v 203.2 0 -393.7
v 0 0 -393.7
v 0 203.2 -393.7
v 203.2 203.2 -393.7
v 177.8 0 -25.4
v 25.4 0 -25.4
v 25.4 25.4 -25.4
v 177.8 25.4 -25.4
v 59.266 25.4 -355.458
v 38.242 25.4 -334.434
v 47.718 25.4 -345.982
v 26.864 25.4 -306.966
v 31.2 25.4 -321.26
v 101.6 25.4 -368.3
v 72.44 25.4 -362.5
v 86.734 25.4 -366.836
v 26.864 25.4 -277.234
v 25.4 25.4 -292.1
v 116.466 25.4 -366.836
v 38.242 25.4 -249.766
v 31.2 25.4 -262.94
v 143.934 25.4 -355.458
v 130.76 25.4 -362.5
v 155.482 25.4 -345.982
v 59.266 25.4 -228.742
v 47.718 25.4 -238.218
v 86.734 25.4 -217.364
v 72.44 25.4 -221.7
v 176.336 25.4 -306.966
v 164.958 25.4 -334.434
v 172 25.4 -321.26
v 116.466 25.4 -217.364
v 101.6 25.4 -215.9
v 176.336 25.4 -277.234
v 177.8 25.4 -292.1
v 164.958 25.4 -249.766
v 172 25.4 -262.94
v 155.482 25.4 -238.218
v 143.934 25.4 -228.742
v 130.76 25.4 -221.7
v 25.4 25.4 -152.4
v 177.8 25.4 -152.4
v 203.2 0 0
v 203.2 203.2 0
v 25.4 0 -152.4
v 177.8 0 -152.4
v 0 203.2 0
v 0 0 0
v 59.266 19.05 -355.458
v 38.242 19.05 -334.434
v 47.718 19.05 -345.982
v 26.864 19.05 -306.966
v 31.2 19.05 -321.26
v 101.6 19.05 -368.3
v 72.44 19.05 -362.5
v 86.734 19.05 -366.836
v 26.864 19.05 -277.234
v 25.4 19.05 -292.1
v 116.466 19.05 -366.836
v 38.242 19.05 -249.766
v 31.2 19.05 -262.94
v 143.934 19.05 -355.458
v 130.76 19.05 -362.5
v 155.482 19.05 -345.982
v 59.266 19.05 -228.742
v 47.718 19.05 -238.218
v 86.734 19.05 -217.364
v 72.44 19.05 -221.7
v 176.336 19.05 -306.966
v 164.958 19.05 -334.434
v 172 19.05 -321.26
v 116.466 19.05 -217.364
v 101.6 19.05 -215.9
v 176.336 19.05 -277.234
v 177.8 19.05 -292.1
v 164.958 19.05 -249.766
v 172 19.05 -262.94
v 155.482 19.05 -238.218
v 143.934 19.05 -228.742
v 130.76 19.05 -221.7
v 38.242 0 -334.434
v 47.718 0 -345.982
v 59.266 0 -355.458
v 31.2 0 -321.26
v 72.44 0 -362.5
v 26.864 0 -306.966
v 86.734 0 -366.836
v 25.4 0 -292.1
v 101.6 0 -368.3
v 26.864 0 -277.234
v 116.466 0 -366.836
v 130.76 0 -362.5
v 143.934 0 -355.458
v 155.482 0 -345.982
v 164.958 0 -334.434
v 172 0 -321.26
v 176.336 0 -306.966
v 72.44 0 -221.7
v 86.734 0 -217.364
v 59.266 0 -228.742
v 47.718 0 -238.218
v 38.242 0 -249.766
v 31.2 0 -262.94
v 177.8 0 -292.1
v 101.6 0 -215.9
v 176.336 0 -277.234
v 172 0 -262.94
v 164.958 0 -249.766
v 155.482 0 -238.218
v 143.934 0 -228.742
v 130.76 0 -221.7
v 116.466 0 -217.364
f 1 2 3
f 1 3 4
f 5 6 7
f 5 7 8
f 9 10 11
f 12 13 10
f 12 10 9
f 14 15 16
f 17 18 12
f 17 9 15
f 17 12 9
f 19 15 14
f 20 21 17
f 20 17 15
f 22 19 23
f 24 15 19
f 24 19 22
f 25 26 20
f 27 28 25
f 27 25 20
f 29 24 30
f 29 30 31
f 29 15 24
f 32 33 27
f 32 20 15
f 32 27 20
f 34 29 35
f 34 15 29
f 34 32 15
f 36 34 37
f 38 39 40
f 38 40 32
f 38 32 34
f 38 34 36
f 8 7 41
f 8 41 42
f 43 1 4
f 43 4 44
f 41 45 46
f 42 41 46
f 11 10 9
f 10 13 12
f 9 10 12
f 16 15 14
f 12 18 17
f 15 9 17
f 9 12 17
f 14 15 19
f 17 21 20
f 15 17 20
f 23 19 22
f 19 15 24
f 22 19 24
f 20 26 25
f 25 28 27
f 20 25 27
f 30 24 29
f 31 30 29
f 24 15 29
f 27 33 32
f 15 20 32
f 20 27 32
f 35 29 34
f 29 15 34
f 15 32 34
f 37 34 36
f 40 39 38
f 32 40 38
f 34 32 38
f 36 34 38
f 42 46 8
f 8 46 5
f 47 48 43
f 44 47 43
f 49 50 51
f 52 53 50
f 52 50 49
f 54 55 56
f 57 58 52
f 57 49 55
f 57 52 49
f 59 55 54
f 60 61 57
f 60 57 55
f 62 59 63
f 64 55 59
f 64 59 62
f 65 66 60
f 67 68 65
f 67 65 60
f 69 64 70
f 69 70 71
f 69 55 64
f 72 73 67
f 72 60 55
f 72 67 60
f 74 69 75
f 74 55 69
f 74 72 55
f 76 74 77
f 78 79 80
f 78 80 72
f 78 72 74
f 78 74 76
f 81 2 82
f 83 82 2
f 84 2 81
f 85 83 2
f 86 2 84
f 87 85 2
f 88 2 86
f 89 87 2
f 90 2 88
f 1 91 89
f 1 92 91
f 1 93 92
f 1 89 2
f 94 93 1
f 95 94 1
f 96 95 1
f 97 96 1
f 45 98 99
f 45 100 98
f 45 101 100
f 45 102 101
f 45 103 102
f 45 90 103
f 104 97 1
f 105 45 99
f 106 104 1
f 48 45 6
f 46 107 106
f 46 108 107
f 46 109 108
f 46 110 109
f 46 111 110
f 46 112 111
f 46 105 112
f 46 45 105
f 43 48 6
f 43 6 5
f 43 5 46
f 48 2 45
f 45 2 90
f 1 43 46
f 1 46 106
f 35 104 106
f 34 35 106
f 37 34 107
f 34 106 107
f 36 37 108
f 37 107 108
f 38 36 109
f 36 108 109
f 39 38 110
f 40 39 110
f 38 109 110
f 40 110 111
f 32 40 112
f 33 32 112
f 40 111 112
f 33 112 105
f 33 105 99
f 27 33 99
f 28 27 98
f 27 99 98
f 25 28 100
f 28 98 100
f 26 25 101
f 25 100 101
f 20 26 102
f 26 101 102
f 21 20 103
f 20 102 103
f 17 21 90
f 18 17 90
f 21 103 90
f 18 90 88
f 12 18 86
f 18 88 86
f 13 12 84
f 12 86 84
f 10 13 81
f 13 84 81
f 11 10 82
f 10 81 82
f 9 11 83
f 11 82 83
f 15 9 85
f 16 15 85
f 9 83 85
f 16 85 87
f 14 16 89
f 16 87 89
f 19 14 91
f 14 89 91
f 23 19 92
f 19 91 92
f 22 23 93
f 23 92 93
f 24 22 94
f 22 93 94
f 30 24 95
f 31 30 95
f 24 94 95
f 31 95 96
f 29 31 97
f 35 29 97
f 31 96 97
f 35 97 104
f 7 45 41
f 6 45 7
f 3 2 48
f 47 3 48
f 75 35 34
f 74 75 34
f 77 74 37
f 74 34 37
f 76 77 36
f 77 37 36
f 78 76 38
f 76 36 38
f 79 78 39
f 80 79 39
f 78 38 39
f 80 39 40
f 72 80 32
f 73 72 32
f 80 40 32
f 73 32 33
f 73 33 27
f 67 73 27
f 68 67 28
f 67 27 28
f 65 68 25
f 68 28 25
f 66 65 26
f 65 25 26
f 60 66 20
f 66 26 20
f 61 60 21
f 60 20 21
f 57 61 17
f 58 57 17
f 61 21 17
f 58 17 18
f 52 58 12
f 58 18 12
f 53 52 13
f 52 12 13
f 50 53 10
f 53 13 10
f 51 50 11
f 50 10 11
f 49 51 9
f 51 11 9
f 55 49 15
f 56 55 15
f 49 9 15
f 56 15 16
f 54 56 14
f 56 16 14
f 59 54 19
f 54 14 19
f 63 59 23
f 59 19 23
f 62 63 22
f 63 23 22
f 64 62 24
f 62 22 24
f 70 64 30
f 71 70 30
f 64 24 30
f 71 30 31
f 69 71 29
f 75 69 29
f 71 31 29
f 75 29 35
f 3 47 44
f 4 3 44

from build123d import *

# Parameters (mm, degrees)
F0_W      = 203.2
F0_H      = 393.7
F1_DEPTH  = 203.2
F2_R      = 76.2
F2_W      = 152.4
F2_H      = 127
F3_DEPTH  = 25.4
F3_FACE_R = 76.2
F4_DEPTH  = 6.35


with BuildPart() as f1:
    # F0 (on Front) → F1 (new body)
    with BuildSketch(Plane.XZ):
        with Locations((101.6, -196.85)):
            Rectangle(F0_W, F0_H)
    extrude(amount=-F1_DEPTH)

    # F2 (on face) → F3 (cut)
    with BuildSketch(Plane.XZ):
        with Locations((101.6, -292.1)):
            Circle(F2_R)
        with Locations((101.6, -88.9)):
            Rectangle(F2_W, F2_H)
    extrude(amount=-F3_DEPTH, mode=Mode.SUBTRACT)


with BuildPart() as f4:
    # F3_face (on face) → F4 (new body)
    with BuildSketch(Plane(origin=(101.6, 25.4, -292.1), x_dir=(1, 0, 0), z_dir=(0, -1, 0))):
        Circle(F3_FACE_R)
    extrude(amount=F4_DEPTH)


solid = Compound([f1.part, f4.part])
